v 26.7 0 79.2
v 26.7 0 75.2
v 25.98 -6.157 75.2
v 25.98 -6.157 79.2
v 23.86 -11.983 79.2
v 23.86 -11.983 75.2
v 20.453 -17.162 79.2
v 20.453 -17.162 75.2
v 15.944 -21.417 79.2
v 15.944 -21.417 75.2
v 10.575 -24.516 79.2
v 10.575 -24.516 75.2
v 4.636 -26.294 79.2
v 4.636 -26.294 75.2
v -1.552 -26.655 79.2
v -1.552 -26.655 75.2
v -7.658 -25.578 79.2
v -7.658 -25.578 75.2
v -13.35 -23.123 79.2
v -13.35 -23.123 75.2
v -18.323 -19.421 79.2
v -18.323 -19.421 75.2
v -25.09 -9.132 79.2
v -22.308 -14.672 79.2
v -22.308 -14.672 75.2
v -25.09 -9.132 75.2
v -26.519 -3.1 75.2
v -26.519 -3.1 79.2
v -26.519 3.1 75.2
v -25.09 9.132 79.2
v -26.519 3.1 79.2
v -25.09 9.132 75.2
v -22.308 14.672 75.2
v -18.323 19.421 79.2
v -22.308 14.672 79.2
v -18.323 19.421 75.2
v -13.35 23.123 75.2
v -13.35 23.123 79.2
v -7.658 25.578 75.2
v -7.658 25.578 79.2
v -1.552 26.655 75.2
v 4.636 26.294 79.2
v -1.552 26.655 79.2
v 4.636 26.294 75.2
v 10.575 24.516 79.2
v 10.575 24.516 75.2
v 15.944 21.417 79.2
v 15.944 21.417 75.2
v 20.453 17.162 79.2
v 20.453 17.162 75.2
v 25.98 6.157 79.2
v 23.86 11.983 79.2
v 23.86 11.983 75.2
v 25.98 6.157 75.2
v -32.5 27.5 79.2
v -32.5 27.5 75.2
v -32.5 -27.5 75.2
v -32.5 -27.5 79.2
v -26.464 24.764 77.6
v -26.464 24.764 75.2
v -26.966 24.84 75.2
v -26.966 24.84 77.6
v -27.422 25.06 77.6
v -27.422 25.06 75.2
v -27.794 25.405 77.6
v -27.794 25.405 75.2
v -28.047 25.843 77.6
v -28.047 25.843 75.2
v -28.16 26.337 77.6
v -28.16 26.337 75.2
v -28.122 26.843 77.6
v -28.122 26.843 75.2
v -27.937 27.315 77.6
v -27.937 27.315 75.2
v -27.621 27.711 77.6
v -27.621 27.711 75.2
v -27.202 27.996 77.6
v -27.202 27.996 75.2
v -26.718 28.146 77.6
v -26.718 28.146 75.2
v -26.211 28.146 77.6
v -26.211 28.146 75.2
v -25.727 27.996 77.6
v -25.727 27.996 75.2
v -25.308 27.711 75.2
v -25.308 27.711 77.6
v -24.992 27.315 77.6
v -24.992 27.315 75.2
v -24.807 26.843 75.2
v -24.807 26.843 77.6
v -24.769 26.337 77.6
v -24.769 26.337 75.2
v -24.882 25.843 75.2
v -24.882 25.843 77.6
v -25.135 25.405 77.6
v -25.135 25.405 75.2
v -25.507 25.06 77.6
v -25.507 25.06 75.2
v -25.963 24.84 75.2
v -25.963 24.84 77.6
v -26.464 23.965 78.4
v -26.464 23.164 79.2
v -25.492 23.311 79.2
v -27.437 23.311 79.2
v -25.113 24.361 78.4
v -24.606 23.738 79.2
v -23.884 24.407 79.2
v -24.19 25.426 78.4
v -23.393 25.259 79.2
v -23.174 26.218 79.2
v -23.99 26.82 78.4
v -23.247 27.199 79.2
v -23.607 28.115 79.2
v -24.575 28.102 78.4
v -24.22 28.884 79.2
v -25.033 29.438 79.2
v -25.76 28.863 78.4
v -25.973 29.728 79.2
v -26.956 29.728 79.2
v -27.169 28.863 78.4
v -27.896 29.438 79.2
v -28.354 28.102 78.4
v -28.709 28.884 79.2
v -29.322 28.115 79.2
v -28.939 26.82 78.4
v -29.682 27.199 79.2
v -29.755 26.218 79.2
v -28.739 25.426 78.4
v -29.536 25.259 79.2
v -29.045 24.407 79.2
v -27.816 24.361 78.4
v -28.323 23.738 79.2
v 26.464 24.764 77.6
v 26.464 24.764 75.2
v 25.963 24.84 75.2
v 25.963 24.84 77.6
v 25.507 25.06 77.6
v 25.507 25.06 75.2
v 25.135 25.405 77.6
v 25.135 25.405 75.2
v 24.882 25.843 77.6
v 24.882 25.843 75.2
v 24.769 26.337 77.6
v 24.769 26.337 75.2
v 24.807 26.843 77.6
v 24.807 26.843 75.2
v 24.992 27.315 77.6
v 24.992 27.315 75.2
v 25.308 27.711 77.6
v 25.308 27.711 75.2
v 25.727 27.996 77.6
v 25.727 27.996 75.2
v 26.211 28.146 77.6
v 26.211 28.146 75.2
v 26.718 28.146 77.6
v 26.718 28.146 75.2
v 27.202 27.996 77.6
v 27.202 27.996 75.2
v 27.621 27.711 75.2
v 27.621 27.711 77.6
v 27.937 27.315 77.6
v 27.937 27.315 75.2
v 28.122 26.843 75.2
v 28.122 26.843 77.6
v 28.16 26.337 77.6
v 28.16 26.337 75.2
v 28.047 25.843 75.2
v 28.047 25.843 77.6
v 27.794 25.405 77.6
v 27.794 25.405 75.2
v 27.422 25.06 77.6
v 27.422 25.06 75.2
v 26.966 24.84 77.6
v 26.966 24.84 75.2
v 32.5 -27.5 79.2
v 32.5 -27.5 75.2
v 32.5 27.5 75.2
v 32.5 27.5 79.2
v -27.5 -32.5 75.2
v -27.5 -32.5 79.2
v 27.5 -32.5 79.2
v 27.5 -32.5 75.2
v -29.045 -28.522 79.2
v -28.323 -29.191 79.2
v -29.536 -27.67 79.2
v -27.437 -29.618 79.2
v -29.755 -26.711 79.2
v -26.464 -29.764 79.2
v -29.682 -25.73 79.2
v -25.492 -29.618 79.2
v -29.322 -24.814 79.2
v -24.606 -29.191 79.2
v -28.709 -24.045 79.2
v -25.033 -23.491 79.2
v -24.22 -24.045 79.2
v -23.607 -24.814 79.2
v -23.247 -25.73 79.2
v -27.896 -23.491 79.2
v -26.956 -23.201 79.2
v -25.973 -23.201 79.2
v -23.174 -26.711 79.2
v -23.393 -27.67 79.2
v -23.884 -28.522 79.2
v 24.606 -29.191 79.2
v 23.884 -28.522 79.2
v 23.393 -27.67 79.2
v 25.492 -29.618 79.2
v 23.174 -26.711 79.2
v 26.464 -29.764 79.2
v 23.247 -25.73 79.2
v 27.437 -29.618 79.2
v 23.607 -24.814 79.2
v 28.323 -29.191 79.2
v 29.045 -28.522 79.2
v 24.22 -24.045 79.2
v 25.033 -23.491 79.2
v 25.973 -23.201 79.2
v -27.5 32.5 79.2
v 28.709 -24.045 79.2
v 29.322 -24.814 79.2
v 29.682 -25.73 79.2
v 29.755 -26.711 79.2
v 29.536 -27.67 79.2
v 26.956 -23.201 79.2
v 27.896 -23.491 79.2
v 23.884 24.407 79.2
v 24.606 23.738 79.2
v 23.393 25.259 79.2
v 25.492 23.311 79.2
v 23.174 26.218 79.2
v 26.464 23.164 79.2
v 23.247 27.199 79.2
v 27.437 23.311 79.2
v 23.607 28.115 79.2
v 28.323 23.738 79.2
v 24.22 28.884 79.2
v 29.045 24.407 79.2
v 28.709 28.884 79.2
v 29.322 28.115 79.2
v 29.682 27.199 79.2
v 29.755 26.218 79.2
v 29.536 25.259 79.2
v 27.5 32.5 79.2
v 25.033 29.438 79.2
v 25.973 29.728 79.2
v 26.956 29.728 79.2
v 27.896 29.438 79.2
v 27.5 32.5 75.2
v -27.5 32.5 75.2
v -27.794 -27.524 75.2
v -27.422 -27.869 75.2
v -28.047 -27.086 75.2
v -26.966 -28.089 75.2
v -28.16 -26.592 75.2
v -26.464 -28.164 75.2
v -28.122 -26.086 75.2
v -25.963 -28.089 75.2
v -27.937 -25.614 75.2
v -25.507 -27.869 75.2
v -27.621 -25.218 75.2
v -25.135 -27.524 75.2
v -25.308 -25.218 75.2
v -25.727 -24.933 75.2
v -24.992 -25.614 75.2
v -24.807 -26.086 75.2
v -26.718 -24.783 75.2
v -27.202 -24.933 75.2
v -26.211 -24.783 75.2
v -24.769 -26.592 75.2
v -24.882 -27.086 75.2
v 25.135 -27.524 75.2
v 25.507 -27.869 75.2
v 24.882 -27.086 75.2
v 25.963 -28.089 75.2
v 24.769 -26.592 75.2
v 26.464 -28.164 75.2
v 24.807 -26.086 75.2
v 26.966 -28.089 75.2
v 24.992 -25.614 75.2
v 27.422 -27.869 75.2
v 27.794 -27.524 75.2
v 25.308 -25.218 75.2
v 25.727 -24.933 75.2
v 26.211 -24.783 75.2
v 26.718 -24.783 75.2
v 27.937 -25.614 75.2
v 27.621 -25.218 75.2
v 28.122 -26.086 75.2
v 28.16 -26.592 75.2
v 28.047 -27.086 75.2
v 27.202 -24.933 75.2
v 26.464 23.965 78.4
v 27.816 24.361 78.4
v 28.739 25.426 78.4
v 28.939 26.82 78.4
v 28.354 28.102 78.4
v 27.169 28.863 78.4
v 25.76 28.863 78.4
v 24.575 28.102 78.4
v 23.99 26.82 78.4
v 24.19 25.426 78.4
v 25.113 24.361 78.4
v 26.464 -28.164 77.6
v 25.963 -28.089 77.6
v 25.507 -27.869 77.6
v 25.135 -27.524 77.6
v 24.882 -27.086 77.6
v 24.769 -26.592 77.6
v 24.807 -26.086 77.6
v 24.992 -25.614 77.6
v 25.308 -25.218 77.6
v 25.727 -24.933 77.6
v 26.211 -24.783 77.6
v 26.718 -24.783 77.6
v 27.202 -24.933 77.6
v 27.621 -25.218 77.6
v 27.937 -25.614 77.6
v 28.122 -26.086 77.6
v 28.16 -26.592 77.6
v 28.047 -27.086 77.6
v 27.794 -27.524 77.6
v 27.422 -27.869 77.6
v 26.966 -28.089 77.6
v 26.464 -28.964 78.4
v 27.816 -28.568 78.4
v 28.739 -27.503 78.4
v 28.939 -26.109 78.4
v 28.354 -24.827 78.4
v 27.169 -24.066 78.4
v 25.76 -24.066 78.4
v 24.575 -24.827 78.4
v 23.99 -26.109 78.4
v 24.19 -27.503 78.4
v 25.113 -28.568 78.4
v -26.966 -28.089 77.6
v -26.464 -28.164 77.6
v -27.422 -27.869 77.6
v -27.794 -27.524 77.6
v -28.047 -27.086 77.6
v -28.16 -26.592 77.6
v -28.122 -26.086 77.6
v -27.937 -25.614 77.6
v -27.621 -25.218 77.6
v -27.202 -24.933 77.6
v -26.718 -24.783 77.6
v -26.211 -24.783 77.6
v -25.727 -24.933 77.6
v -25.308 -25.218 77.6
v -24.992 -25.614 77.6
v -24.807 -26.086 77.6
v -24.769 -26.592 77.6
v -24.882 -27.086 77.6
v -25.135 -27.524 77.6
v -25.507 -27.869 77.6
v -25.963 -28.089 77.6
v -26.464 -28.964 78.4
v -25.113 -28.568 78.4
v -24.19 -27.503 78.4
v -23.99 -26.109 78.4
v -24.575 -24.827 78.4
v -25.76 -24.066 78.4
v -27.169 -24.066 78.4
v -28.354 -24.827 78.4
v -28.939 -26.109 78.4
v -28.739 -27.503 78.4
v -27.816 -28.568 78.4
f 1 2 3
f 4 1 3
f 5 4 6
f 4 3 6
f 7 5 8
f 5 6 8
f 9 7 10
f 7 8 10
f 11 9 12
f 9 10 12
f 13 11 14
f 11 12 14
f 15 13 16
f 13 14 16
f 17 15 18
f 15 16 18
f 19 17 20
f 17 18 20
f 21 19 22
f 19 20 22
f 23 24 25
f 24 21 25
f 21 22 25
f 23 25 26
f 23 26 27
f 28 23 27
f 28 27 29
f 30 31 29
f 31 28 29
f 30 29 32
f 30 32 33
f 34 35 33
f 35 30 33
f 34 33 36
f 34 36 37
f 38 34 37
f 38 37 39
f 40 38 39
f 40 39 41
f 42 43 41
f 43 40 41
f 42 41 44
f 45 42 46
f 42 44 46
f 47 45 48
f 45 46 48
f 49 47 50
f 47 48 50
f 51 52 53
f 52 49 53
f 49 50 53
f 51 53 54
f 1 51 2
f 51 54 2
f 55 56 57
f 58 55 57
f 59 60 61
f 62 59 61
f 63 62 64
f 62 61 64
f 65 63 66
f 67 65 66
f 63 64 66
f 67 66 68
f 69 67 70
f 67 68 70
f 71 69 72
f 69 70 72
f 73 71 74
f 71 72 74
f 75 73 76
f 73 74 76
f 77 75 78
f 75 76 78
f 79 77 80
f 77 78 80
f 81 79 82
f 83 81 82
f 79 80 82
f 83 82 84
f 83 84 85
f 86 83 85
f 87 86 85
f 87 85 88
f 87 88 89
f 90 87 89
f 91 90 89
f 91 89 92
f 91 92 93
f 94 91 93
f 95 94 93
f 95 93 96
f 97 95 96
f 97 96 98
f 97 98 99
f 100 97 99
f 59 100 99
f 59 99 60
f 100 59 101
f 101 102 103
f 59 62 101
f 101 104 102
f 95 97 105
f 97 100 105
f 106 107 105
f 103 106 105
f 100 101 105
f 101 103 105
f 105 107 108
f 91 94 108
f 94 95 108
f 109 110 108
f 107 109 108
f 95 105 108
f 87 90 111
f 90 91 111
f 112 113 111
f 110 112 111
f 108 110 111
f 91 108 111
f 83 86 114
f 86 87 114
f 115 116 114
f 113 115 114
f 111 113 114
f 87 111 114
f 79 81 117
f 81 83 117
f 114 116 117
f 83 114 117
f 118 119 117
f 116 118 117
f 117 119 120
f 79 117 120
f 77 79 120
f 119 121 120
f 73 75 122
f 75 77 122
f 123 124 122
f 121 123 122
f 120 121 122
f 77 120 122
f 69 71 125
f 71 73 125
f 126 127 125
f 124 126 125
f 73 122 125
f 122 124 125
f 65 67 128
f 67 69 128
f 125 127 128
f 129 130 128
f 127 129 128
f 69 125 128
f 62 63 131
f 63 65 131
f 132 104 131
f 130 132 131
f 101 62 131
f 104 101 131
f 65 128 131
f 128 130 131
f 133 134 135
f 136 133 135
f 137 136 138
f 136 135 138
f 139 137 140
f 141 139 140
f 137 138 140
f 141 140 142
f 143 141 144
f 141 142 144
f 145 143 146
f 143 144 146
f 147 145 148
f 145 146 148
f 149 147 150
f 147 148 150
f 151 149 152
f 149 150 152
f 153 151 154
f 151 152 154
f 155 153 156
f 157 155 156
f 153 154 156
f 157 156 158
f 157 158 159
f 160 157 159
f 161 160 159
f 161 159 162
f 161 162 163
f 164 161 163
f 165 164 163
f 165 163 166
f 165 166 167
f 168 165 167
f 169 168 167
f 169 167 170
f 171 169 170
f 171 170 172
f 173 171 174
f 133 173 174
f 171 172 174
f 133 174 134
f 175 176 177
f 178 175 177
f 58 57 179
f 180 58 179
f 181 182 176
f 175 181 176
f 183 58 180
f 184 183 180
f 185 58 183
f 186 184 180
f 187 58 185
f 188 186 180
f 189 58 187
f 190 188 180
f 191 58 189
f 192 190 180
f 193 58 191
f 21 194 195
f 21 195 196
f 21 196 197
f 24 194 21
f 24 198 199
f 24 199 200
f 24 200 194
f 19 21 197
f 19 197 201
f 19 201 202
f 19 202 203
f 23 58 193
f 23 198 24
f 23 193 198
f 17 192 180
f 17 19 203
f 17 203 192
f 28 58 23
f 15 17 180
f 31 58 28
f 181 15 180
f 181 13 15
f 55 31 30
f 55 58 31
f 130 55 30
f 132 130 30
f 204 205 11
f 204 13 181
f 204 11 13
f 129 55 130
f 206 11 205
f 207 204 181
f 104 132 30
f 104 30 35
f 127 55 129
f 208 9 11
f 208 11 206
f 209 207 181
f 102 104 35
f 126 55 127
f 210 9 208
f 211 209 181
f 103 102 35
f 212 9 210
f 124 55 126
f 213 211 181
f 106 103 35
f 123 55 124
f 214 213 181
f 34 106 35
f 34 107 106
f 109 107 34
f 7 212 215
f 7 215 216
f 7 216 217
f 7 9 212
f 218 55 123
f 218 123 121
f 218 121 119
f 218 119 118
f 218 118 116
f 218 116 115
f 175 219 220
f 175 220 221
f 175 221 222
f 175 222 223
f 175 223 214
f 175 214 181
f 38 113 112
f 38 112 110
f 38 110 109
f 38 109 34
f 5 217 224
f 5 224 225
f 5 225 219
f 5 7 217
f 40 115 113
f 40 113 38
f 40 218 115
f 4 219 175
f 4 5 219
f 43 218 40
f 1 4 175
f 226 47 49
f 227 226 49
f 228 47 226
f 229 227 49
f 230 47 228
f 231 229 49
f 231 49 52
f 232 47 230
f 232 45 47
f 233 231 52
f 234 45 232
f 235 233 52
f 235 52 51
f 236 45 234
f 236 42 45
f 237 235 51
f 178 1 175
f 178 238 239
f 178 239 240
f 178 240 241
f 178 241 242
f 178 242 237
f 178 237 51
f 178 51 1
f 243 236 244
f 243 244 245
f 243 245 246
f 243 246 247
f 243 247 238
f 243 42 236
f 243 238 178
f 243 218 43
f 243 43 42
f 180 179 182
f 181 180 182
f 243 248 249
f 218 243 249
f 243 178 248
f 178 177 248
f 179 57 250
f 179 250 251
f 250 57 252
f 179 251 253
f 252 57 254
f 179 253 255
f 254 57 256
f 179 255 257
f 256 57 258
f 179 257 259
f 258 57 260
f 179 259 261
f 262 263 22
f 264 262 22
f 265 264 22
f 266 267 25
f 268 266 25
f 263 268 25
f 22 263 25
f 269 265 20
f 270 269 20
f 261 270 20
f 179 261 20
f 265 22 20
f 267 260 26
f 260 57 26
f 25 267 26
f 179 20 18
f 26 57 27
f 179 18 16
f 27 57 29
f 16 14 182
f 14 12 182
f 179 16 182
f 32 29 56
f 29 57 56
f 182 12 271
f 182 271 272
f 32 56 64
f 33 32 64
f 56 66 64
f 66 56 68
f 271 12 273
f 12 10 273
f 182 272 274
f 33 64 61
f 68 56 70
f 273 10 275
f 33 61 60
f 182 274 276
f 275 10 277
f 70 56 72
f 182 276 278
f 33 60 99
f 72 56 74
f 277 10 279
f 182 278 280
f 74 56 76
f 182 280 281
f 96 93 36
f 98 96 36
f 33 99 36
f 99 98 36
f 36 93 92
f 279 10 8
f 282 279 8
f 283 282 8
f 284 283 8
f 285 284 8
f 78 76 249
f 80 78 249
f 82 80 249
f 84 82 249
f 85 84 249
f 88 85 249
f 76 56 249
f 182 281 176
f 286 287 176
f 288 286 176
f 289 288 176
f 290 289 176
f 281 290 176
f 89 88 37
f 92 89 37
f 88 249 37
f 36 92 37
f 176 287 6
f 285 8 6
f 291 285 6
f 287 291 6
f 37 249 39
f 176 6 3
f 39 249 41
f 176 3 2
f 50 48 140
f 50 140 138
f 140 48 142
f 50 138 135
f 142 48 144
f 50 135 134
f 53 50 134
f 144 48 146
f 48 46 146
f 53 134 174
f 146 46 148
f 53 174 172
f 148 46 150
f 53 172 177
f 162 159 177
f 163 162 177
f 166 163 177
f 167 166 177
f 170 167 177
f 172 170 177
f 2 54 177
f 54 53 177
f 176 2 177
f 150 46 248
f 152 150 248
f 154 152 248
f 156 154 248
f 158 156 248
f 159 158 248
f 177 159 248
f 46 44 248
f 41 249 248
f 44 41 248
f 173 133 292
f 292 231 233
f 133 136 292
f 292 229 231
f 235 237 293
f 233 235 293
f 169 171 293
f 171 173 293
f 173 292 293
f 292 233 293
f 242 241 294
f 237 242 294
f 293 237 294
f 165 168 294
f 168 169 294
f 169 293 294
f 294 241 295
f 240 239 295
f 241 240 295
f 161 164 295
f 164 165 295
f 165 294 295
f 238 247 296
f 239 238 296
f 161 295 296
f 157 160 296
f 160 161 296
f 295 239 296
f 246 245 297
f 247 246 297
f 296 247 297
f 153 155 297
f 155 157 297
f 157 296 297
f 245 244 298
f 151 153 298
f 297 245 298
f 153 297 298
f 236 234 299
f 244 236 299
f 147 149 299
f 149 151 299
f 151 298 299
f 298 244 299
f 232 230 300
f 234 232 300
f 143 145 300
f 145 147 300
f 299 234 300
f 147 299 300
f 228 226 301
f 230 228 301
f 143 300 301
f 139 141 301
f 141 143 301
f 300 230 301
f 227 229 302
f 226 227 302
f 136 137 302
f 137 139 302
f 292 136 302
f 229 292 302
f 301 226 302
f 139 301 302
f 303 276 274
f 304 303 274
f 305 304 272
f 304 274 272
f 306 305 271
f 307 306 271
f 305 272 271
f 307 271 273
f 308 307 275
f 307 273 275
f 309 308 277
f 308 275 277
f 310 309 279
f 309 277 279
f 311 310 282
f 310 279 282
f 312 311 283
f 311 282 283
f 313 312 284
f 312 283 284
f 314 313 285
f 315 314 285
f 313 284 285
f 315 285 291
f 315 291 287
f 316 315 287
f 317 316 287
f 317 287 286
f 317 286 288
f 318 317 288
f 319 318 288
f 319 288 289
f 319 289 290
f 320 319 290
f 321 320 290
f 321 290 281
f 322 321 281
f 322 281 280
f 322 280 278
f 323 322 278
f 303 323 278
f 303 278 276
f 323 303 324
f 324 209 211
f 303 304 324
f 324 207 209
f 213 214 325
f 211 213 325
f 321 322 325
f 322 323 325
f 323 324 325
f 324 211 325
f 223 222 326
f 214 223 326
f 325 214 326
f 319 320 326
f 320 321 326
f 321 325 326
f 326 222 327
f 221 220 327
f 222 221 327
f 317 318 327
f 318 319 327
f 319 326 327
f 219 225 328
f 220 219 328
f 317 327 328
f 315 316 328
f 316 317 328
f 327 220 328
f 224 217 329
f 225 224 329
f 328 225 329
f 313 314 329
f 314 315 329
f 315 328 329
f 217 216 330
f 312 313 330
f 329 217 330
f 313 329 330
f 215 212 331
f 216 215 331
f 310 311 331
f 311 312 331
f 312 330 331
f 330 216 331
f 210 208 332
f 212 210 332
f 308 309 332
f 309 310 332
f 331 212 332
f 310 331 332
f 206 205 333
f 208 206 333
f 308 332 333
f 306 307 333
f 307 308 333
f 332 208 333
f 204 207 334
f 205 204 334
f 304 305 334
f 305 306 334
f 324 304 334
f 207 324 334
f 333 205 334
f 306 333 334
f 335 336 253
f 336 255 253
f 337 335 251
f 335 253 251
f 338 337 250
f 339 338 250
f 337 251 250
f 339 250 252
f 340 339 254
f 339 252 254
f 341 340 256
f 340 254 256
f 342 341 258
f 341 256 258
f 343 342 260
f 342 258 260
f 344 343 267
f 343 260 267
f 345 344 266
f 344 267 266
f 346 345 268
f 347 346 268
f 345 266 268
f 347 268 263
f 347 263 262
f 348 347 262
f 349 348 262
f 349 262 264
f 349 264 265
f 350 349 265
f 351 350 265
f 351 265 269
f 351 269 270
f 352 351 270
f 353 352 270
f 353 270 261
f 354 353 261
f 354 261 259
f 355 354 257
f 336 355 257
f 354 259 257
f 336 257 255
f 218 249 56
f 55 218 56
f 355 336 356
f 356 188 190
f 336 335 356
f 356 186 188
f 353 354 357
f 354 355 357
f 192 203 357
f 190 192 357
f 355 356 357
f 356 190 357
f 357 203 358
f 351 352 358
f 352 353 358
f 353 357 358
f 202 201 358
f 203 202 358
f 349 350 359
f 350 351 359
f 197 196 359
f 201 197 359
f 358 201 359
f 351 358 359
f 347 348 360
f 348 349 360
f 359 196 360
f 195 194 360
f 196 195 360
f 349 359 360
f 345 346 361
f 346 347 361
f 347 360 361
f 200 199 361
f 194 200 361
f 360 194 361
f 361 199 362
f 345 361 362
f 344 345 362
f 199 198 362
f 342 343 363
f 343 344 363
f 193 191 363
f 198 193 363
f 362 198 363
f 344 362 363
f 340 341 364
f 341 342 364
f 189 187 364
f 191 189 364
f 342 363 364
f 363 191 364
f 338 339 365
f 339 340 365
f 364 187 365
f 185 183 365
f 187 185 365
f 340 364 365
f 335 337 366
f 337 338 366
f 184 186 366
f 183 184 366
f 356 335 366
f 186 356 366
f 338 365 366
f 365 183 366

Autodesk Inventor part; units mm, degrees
ref_plane "YZ Plane" through (0, 0, 0) normal (1, 0, 0) x (0, 1, 0)
ref_plane "XZ Plane" through (0, 0, 0) normal (0, 1, 0) x (-1, 0, 0)
ref_plane "РабПлоскость1" through (0, 0, 75.2) normal (0, 0, 1) x (1, 0, 0)
sketch "Эскиз1" plane through (0, 0, 75.2) normal (0, 0, 1) x (1, 0, 0)
  circle A0 centre (26.4645, -26.4645) radius 1.95 construction
  circle A1 centre (-26.4645, 26.4645) radius 1.95 construction
  circle A2 centre (26.4645, 26.4645) radius 1.95 construction
  circle A3 centre (-26.4645, -26.4645) radius 1.95 construction
  circle A4 centre (15.35, -15.35) radius 1.7 construction
  circle A5 centre (-15.35, 15.35) radius 1.7 construction
  circle A6 centre (15.35, 15.35) radius 1.7 construction
  circle A7 centre (-15.35, -15.35) radius 1.7 construction
  line L0 (-32.5, 27.5) -> (-32.5, -27.5) projected
  line L1 (-27.5, 32.5) -> (-32.5, 27.5) projected
  line L2 (27.5, 32.5) -> (-27.5, 32.5) projected
  line L3 (32.5, 27.5) -> (27.5, 32.5) projected
  line L4 (32.5, -27.5) -> (32.5, 27.5) projected
  line L5 (27.5, -32.5) -> (32.5, -27.5) projected
  line L6 (-27.5, -32.5) -> (27.5, -32.5) projected
  line L7 (-32.5, -27.5) -> (-27.5, -32.5) projected
  circle A8 centre (0, 0) radius 11.5 construction
  circle A9 centre (0, 0) radius 26.7 projected
  point P0 (0, 0)
extrude "Выдавливание1" add sketch "Эскиз1" along normal blind 4
sketch "Эскиз2" plane through (0, 0, 79.2) normal (0, 0, 1) x (1, 0, 0)
  circle A0 centre (26.4645, 26.4645) radius 2.25 projected
  circle A1 centre (26.4645, -26.4645) radius 2.25 projected
  circle A2 centre (-26.4645, -26.4645) radius 2.25 projected
  circle A3 centre (-26.4645, 26.4645) radius 1.95 projected
hole "Отверстие1" at (26.4645, 26.4645, 79.2) at (-26.4645, 26.4645, 79.2) at (26.4645, -26.4645, 79.2) at (-26.4645, -26.4645, 79.2) direction (0, 0, -1) diameter 3.4 end through all countersink diameter 6.6 countersink angle 90 clearance for "с потайной головкой ГОСТ 12876-67" size "M3" standard "ГОСТ"
properties part number "Крышка" material "По умолчанию1"
